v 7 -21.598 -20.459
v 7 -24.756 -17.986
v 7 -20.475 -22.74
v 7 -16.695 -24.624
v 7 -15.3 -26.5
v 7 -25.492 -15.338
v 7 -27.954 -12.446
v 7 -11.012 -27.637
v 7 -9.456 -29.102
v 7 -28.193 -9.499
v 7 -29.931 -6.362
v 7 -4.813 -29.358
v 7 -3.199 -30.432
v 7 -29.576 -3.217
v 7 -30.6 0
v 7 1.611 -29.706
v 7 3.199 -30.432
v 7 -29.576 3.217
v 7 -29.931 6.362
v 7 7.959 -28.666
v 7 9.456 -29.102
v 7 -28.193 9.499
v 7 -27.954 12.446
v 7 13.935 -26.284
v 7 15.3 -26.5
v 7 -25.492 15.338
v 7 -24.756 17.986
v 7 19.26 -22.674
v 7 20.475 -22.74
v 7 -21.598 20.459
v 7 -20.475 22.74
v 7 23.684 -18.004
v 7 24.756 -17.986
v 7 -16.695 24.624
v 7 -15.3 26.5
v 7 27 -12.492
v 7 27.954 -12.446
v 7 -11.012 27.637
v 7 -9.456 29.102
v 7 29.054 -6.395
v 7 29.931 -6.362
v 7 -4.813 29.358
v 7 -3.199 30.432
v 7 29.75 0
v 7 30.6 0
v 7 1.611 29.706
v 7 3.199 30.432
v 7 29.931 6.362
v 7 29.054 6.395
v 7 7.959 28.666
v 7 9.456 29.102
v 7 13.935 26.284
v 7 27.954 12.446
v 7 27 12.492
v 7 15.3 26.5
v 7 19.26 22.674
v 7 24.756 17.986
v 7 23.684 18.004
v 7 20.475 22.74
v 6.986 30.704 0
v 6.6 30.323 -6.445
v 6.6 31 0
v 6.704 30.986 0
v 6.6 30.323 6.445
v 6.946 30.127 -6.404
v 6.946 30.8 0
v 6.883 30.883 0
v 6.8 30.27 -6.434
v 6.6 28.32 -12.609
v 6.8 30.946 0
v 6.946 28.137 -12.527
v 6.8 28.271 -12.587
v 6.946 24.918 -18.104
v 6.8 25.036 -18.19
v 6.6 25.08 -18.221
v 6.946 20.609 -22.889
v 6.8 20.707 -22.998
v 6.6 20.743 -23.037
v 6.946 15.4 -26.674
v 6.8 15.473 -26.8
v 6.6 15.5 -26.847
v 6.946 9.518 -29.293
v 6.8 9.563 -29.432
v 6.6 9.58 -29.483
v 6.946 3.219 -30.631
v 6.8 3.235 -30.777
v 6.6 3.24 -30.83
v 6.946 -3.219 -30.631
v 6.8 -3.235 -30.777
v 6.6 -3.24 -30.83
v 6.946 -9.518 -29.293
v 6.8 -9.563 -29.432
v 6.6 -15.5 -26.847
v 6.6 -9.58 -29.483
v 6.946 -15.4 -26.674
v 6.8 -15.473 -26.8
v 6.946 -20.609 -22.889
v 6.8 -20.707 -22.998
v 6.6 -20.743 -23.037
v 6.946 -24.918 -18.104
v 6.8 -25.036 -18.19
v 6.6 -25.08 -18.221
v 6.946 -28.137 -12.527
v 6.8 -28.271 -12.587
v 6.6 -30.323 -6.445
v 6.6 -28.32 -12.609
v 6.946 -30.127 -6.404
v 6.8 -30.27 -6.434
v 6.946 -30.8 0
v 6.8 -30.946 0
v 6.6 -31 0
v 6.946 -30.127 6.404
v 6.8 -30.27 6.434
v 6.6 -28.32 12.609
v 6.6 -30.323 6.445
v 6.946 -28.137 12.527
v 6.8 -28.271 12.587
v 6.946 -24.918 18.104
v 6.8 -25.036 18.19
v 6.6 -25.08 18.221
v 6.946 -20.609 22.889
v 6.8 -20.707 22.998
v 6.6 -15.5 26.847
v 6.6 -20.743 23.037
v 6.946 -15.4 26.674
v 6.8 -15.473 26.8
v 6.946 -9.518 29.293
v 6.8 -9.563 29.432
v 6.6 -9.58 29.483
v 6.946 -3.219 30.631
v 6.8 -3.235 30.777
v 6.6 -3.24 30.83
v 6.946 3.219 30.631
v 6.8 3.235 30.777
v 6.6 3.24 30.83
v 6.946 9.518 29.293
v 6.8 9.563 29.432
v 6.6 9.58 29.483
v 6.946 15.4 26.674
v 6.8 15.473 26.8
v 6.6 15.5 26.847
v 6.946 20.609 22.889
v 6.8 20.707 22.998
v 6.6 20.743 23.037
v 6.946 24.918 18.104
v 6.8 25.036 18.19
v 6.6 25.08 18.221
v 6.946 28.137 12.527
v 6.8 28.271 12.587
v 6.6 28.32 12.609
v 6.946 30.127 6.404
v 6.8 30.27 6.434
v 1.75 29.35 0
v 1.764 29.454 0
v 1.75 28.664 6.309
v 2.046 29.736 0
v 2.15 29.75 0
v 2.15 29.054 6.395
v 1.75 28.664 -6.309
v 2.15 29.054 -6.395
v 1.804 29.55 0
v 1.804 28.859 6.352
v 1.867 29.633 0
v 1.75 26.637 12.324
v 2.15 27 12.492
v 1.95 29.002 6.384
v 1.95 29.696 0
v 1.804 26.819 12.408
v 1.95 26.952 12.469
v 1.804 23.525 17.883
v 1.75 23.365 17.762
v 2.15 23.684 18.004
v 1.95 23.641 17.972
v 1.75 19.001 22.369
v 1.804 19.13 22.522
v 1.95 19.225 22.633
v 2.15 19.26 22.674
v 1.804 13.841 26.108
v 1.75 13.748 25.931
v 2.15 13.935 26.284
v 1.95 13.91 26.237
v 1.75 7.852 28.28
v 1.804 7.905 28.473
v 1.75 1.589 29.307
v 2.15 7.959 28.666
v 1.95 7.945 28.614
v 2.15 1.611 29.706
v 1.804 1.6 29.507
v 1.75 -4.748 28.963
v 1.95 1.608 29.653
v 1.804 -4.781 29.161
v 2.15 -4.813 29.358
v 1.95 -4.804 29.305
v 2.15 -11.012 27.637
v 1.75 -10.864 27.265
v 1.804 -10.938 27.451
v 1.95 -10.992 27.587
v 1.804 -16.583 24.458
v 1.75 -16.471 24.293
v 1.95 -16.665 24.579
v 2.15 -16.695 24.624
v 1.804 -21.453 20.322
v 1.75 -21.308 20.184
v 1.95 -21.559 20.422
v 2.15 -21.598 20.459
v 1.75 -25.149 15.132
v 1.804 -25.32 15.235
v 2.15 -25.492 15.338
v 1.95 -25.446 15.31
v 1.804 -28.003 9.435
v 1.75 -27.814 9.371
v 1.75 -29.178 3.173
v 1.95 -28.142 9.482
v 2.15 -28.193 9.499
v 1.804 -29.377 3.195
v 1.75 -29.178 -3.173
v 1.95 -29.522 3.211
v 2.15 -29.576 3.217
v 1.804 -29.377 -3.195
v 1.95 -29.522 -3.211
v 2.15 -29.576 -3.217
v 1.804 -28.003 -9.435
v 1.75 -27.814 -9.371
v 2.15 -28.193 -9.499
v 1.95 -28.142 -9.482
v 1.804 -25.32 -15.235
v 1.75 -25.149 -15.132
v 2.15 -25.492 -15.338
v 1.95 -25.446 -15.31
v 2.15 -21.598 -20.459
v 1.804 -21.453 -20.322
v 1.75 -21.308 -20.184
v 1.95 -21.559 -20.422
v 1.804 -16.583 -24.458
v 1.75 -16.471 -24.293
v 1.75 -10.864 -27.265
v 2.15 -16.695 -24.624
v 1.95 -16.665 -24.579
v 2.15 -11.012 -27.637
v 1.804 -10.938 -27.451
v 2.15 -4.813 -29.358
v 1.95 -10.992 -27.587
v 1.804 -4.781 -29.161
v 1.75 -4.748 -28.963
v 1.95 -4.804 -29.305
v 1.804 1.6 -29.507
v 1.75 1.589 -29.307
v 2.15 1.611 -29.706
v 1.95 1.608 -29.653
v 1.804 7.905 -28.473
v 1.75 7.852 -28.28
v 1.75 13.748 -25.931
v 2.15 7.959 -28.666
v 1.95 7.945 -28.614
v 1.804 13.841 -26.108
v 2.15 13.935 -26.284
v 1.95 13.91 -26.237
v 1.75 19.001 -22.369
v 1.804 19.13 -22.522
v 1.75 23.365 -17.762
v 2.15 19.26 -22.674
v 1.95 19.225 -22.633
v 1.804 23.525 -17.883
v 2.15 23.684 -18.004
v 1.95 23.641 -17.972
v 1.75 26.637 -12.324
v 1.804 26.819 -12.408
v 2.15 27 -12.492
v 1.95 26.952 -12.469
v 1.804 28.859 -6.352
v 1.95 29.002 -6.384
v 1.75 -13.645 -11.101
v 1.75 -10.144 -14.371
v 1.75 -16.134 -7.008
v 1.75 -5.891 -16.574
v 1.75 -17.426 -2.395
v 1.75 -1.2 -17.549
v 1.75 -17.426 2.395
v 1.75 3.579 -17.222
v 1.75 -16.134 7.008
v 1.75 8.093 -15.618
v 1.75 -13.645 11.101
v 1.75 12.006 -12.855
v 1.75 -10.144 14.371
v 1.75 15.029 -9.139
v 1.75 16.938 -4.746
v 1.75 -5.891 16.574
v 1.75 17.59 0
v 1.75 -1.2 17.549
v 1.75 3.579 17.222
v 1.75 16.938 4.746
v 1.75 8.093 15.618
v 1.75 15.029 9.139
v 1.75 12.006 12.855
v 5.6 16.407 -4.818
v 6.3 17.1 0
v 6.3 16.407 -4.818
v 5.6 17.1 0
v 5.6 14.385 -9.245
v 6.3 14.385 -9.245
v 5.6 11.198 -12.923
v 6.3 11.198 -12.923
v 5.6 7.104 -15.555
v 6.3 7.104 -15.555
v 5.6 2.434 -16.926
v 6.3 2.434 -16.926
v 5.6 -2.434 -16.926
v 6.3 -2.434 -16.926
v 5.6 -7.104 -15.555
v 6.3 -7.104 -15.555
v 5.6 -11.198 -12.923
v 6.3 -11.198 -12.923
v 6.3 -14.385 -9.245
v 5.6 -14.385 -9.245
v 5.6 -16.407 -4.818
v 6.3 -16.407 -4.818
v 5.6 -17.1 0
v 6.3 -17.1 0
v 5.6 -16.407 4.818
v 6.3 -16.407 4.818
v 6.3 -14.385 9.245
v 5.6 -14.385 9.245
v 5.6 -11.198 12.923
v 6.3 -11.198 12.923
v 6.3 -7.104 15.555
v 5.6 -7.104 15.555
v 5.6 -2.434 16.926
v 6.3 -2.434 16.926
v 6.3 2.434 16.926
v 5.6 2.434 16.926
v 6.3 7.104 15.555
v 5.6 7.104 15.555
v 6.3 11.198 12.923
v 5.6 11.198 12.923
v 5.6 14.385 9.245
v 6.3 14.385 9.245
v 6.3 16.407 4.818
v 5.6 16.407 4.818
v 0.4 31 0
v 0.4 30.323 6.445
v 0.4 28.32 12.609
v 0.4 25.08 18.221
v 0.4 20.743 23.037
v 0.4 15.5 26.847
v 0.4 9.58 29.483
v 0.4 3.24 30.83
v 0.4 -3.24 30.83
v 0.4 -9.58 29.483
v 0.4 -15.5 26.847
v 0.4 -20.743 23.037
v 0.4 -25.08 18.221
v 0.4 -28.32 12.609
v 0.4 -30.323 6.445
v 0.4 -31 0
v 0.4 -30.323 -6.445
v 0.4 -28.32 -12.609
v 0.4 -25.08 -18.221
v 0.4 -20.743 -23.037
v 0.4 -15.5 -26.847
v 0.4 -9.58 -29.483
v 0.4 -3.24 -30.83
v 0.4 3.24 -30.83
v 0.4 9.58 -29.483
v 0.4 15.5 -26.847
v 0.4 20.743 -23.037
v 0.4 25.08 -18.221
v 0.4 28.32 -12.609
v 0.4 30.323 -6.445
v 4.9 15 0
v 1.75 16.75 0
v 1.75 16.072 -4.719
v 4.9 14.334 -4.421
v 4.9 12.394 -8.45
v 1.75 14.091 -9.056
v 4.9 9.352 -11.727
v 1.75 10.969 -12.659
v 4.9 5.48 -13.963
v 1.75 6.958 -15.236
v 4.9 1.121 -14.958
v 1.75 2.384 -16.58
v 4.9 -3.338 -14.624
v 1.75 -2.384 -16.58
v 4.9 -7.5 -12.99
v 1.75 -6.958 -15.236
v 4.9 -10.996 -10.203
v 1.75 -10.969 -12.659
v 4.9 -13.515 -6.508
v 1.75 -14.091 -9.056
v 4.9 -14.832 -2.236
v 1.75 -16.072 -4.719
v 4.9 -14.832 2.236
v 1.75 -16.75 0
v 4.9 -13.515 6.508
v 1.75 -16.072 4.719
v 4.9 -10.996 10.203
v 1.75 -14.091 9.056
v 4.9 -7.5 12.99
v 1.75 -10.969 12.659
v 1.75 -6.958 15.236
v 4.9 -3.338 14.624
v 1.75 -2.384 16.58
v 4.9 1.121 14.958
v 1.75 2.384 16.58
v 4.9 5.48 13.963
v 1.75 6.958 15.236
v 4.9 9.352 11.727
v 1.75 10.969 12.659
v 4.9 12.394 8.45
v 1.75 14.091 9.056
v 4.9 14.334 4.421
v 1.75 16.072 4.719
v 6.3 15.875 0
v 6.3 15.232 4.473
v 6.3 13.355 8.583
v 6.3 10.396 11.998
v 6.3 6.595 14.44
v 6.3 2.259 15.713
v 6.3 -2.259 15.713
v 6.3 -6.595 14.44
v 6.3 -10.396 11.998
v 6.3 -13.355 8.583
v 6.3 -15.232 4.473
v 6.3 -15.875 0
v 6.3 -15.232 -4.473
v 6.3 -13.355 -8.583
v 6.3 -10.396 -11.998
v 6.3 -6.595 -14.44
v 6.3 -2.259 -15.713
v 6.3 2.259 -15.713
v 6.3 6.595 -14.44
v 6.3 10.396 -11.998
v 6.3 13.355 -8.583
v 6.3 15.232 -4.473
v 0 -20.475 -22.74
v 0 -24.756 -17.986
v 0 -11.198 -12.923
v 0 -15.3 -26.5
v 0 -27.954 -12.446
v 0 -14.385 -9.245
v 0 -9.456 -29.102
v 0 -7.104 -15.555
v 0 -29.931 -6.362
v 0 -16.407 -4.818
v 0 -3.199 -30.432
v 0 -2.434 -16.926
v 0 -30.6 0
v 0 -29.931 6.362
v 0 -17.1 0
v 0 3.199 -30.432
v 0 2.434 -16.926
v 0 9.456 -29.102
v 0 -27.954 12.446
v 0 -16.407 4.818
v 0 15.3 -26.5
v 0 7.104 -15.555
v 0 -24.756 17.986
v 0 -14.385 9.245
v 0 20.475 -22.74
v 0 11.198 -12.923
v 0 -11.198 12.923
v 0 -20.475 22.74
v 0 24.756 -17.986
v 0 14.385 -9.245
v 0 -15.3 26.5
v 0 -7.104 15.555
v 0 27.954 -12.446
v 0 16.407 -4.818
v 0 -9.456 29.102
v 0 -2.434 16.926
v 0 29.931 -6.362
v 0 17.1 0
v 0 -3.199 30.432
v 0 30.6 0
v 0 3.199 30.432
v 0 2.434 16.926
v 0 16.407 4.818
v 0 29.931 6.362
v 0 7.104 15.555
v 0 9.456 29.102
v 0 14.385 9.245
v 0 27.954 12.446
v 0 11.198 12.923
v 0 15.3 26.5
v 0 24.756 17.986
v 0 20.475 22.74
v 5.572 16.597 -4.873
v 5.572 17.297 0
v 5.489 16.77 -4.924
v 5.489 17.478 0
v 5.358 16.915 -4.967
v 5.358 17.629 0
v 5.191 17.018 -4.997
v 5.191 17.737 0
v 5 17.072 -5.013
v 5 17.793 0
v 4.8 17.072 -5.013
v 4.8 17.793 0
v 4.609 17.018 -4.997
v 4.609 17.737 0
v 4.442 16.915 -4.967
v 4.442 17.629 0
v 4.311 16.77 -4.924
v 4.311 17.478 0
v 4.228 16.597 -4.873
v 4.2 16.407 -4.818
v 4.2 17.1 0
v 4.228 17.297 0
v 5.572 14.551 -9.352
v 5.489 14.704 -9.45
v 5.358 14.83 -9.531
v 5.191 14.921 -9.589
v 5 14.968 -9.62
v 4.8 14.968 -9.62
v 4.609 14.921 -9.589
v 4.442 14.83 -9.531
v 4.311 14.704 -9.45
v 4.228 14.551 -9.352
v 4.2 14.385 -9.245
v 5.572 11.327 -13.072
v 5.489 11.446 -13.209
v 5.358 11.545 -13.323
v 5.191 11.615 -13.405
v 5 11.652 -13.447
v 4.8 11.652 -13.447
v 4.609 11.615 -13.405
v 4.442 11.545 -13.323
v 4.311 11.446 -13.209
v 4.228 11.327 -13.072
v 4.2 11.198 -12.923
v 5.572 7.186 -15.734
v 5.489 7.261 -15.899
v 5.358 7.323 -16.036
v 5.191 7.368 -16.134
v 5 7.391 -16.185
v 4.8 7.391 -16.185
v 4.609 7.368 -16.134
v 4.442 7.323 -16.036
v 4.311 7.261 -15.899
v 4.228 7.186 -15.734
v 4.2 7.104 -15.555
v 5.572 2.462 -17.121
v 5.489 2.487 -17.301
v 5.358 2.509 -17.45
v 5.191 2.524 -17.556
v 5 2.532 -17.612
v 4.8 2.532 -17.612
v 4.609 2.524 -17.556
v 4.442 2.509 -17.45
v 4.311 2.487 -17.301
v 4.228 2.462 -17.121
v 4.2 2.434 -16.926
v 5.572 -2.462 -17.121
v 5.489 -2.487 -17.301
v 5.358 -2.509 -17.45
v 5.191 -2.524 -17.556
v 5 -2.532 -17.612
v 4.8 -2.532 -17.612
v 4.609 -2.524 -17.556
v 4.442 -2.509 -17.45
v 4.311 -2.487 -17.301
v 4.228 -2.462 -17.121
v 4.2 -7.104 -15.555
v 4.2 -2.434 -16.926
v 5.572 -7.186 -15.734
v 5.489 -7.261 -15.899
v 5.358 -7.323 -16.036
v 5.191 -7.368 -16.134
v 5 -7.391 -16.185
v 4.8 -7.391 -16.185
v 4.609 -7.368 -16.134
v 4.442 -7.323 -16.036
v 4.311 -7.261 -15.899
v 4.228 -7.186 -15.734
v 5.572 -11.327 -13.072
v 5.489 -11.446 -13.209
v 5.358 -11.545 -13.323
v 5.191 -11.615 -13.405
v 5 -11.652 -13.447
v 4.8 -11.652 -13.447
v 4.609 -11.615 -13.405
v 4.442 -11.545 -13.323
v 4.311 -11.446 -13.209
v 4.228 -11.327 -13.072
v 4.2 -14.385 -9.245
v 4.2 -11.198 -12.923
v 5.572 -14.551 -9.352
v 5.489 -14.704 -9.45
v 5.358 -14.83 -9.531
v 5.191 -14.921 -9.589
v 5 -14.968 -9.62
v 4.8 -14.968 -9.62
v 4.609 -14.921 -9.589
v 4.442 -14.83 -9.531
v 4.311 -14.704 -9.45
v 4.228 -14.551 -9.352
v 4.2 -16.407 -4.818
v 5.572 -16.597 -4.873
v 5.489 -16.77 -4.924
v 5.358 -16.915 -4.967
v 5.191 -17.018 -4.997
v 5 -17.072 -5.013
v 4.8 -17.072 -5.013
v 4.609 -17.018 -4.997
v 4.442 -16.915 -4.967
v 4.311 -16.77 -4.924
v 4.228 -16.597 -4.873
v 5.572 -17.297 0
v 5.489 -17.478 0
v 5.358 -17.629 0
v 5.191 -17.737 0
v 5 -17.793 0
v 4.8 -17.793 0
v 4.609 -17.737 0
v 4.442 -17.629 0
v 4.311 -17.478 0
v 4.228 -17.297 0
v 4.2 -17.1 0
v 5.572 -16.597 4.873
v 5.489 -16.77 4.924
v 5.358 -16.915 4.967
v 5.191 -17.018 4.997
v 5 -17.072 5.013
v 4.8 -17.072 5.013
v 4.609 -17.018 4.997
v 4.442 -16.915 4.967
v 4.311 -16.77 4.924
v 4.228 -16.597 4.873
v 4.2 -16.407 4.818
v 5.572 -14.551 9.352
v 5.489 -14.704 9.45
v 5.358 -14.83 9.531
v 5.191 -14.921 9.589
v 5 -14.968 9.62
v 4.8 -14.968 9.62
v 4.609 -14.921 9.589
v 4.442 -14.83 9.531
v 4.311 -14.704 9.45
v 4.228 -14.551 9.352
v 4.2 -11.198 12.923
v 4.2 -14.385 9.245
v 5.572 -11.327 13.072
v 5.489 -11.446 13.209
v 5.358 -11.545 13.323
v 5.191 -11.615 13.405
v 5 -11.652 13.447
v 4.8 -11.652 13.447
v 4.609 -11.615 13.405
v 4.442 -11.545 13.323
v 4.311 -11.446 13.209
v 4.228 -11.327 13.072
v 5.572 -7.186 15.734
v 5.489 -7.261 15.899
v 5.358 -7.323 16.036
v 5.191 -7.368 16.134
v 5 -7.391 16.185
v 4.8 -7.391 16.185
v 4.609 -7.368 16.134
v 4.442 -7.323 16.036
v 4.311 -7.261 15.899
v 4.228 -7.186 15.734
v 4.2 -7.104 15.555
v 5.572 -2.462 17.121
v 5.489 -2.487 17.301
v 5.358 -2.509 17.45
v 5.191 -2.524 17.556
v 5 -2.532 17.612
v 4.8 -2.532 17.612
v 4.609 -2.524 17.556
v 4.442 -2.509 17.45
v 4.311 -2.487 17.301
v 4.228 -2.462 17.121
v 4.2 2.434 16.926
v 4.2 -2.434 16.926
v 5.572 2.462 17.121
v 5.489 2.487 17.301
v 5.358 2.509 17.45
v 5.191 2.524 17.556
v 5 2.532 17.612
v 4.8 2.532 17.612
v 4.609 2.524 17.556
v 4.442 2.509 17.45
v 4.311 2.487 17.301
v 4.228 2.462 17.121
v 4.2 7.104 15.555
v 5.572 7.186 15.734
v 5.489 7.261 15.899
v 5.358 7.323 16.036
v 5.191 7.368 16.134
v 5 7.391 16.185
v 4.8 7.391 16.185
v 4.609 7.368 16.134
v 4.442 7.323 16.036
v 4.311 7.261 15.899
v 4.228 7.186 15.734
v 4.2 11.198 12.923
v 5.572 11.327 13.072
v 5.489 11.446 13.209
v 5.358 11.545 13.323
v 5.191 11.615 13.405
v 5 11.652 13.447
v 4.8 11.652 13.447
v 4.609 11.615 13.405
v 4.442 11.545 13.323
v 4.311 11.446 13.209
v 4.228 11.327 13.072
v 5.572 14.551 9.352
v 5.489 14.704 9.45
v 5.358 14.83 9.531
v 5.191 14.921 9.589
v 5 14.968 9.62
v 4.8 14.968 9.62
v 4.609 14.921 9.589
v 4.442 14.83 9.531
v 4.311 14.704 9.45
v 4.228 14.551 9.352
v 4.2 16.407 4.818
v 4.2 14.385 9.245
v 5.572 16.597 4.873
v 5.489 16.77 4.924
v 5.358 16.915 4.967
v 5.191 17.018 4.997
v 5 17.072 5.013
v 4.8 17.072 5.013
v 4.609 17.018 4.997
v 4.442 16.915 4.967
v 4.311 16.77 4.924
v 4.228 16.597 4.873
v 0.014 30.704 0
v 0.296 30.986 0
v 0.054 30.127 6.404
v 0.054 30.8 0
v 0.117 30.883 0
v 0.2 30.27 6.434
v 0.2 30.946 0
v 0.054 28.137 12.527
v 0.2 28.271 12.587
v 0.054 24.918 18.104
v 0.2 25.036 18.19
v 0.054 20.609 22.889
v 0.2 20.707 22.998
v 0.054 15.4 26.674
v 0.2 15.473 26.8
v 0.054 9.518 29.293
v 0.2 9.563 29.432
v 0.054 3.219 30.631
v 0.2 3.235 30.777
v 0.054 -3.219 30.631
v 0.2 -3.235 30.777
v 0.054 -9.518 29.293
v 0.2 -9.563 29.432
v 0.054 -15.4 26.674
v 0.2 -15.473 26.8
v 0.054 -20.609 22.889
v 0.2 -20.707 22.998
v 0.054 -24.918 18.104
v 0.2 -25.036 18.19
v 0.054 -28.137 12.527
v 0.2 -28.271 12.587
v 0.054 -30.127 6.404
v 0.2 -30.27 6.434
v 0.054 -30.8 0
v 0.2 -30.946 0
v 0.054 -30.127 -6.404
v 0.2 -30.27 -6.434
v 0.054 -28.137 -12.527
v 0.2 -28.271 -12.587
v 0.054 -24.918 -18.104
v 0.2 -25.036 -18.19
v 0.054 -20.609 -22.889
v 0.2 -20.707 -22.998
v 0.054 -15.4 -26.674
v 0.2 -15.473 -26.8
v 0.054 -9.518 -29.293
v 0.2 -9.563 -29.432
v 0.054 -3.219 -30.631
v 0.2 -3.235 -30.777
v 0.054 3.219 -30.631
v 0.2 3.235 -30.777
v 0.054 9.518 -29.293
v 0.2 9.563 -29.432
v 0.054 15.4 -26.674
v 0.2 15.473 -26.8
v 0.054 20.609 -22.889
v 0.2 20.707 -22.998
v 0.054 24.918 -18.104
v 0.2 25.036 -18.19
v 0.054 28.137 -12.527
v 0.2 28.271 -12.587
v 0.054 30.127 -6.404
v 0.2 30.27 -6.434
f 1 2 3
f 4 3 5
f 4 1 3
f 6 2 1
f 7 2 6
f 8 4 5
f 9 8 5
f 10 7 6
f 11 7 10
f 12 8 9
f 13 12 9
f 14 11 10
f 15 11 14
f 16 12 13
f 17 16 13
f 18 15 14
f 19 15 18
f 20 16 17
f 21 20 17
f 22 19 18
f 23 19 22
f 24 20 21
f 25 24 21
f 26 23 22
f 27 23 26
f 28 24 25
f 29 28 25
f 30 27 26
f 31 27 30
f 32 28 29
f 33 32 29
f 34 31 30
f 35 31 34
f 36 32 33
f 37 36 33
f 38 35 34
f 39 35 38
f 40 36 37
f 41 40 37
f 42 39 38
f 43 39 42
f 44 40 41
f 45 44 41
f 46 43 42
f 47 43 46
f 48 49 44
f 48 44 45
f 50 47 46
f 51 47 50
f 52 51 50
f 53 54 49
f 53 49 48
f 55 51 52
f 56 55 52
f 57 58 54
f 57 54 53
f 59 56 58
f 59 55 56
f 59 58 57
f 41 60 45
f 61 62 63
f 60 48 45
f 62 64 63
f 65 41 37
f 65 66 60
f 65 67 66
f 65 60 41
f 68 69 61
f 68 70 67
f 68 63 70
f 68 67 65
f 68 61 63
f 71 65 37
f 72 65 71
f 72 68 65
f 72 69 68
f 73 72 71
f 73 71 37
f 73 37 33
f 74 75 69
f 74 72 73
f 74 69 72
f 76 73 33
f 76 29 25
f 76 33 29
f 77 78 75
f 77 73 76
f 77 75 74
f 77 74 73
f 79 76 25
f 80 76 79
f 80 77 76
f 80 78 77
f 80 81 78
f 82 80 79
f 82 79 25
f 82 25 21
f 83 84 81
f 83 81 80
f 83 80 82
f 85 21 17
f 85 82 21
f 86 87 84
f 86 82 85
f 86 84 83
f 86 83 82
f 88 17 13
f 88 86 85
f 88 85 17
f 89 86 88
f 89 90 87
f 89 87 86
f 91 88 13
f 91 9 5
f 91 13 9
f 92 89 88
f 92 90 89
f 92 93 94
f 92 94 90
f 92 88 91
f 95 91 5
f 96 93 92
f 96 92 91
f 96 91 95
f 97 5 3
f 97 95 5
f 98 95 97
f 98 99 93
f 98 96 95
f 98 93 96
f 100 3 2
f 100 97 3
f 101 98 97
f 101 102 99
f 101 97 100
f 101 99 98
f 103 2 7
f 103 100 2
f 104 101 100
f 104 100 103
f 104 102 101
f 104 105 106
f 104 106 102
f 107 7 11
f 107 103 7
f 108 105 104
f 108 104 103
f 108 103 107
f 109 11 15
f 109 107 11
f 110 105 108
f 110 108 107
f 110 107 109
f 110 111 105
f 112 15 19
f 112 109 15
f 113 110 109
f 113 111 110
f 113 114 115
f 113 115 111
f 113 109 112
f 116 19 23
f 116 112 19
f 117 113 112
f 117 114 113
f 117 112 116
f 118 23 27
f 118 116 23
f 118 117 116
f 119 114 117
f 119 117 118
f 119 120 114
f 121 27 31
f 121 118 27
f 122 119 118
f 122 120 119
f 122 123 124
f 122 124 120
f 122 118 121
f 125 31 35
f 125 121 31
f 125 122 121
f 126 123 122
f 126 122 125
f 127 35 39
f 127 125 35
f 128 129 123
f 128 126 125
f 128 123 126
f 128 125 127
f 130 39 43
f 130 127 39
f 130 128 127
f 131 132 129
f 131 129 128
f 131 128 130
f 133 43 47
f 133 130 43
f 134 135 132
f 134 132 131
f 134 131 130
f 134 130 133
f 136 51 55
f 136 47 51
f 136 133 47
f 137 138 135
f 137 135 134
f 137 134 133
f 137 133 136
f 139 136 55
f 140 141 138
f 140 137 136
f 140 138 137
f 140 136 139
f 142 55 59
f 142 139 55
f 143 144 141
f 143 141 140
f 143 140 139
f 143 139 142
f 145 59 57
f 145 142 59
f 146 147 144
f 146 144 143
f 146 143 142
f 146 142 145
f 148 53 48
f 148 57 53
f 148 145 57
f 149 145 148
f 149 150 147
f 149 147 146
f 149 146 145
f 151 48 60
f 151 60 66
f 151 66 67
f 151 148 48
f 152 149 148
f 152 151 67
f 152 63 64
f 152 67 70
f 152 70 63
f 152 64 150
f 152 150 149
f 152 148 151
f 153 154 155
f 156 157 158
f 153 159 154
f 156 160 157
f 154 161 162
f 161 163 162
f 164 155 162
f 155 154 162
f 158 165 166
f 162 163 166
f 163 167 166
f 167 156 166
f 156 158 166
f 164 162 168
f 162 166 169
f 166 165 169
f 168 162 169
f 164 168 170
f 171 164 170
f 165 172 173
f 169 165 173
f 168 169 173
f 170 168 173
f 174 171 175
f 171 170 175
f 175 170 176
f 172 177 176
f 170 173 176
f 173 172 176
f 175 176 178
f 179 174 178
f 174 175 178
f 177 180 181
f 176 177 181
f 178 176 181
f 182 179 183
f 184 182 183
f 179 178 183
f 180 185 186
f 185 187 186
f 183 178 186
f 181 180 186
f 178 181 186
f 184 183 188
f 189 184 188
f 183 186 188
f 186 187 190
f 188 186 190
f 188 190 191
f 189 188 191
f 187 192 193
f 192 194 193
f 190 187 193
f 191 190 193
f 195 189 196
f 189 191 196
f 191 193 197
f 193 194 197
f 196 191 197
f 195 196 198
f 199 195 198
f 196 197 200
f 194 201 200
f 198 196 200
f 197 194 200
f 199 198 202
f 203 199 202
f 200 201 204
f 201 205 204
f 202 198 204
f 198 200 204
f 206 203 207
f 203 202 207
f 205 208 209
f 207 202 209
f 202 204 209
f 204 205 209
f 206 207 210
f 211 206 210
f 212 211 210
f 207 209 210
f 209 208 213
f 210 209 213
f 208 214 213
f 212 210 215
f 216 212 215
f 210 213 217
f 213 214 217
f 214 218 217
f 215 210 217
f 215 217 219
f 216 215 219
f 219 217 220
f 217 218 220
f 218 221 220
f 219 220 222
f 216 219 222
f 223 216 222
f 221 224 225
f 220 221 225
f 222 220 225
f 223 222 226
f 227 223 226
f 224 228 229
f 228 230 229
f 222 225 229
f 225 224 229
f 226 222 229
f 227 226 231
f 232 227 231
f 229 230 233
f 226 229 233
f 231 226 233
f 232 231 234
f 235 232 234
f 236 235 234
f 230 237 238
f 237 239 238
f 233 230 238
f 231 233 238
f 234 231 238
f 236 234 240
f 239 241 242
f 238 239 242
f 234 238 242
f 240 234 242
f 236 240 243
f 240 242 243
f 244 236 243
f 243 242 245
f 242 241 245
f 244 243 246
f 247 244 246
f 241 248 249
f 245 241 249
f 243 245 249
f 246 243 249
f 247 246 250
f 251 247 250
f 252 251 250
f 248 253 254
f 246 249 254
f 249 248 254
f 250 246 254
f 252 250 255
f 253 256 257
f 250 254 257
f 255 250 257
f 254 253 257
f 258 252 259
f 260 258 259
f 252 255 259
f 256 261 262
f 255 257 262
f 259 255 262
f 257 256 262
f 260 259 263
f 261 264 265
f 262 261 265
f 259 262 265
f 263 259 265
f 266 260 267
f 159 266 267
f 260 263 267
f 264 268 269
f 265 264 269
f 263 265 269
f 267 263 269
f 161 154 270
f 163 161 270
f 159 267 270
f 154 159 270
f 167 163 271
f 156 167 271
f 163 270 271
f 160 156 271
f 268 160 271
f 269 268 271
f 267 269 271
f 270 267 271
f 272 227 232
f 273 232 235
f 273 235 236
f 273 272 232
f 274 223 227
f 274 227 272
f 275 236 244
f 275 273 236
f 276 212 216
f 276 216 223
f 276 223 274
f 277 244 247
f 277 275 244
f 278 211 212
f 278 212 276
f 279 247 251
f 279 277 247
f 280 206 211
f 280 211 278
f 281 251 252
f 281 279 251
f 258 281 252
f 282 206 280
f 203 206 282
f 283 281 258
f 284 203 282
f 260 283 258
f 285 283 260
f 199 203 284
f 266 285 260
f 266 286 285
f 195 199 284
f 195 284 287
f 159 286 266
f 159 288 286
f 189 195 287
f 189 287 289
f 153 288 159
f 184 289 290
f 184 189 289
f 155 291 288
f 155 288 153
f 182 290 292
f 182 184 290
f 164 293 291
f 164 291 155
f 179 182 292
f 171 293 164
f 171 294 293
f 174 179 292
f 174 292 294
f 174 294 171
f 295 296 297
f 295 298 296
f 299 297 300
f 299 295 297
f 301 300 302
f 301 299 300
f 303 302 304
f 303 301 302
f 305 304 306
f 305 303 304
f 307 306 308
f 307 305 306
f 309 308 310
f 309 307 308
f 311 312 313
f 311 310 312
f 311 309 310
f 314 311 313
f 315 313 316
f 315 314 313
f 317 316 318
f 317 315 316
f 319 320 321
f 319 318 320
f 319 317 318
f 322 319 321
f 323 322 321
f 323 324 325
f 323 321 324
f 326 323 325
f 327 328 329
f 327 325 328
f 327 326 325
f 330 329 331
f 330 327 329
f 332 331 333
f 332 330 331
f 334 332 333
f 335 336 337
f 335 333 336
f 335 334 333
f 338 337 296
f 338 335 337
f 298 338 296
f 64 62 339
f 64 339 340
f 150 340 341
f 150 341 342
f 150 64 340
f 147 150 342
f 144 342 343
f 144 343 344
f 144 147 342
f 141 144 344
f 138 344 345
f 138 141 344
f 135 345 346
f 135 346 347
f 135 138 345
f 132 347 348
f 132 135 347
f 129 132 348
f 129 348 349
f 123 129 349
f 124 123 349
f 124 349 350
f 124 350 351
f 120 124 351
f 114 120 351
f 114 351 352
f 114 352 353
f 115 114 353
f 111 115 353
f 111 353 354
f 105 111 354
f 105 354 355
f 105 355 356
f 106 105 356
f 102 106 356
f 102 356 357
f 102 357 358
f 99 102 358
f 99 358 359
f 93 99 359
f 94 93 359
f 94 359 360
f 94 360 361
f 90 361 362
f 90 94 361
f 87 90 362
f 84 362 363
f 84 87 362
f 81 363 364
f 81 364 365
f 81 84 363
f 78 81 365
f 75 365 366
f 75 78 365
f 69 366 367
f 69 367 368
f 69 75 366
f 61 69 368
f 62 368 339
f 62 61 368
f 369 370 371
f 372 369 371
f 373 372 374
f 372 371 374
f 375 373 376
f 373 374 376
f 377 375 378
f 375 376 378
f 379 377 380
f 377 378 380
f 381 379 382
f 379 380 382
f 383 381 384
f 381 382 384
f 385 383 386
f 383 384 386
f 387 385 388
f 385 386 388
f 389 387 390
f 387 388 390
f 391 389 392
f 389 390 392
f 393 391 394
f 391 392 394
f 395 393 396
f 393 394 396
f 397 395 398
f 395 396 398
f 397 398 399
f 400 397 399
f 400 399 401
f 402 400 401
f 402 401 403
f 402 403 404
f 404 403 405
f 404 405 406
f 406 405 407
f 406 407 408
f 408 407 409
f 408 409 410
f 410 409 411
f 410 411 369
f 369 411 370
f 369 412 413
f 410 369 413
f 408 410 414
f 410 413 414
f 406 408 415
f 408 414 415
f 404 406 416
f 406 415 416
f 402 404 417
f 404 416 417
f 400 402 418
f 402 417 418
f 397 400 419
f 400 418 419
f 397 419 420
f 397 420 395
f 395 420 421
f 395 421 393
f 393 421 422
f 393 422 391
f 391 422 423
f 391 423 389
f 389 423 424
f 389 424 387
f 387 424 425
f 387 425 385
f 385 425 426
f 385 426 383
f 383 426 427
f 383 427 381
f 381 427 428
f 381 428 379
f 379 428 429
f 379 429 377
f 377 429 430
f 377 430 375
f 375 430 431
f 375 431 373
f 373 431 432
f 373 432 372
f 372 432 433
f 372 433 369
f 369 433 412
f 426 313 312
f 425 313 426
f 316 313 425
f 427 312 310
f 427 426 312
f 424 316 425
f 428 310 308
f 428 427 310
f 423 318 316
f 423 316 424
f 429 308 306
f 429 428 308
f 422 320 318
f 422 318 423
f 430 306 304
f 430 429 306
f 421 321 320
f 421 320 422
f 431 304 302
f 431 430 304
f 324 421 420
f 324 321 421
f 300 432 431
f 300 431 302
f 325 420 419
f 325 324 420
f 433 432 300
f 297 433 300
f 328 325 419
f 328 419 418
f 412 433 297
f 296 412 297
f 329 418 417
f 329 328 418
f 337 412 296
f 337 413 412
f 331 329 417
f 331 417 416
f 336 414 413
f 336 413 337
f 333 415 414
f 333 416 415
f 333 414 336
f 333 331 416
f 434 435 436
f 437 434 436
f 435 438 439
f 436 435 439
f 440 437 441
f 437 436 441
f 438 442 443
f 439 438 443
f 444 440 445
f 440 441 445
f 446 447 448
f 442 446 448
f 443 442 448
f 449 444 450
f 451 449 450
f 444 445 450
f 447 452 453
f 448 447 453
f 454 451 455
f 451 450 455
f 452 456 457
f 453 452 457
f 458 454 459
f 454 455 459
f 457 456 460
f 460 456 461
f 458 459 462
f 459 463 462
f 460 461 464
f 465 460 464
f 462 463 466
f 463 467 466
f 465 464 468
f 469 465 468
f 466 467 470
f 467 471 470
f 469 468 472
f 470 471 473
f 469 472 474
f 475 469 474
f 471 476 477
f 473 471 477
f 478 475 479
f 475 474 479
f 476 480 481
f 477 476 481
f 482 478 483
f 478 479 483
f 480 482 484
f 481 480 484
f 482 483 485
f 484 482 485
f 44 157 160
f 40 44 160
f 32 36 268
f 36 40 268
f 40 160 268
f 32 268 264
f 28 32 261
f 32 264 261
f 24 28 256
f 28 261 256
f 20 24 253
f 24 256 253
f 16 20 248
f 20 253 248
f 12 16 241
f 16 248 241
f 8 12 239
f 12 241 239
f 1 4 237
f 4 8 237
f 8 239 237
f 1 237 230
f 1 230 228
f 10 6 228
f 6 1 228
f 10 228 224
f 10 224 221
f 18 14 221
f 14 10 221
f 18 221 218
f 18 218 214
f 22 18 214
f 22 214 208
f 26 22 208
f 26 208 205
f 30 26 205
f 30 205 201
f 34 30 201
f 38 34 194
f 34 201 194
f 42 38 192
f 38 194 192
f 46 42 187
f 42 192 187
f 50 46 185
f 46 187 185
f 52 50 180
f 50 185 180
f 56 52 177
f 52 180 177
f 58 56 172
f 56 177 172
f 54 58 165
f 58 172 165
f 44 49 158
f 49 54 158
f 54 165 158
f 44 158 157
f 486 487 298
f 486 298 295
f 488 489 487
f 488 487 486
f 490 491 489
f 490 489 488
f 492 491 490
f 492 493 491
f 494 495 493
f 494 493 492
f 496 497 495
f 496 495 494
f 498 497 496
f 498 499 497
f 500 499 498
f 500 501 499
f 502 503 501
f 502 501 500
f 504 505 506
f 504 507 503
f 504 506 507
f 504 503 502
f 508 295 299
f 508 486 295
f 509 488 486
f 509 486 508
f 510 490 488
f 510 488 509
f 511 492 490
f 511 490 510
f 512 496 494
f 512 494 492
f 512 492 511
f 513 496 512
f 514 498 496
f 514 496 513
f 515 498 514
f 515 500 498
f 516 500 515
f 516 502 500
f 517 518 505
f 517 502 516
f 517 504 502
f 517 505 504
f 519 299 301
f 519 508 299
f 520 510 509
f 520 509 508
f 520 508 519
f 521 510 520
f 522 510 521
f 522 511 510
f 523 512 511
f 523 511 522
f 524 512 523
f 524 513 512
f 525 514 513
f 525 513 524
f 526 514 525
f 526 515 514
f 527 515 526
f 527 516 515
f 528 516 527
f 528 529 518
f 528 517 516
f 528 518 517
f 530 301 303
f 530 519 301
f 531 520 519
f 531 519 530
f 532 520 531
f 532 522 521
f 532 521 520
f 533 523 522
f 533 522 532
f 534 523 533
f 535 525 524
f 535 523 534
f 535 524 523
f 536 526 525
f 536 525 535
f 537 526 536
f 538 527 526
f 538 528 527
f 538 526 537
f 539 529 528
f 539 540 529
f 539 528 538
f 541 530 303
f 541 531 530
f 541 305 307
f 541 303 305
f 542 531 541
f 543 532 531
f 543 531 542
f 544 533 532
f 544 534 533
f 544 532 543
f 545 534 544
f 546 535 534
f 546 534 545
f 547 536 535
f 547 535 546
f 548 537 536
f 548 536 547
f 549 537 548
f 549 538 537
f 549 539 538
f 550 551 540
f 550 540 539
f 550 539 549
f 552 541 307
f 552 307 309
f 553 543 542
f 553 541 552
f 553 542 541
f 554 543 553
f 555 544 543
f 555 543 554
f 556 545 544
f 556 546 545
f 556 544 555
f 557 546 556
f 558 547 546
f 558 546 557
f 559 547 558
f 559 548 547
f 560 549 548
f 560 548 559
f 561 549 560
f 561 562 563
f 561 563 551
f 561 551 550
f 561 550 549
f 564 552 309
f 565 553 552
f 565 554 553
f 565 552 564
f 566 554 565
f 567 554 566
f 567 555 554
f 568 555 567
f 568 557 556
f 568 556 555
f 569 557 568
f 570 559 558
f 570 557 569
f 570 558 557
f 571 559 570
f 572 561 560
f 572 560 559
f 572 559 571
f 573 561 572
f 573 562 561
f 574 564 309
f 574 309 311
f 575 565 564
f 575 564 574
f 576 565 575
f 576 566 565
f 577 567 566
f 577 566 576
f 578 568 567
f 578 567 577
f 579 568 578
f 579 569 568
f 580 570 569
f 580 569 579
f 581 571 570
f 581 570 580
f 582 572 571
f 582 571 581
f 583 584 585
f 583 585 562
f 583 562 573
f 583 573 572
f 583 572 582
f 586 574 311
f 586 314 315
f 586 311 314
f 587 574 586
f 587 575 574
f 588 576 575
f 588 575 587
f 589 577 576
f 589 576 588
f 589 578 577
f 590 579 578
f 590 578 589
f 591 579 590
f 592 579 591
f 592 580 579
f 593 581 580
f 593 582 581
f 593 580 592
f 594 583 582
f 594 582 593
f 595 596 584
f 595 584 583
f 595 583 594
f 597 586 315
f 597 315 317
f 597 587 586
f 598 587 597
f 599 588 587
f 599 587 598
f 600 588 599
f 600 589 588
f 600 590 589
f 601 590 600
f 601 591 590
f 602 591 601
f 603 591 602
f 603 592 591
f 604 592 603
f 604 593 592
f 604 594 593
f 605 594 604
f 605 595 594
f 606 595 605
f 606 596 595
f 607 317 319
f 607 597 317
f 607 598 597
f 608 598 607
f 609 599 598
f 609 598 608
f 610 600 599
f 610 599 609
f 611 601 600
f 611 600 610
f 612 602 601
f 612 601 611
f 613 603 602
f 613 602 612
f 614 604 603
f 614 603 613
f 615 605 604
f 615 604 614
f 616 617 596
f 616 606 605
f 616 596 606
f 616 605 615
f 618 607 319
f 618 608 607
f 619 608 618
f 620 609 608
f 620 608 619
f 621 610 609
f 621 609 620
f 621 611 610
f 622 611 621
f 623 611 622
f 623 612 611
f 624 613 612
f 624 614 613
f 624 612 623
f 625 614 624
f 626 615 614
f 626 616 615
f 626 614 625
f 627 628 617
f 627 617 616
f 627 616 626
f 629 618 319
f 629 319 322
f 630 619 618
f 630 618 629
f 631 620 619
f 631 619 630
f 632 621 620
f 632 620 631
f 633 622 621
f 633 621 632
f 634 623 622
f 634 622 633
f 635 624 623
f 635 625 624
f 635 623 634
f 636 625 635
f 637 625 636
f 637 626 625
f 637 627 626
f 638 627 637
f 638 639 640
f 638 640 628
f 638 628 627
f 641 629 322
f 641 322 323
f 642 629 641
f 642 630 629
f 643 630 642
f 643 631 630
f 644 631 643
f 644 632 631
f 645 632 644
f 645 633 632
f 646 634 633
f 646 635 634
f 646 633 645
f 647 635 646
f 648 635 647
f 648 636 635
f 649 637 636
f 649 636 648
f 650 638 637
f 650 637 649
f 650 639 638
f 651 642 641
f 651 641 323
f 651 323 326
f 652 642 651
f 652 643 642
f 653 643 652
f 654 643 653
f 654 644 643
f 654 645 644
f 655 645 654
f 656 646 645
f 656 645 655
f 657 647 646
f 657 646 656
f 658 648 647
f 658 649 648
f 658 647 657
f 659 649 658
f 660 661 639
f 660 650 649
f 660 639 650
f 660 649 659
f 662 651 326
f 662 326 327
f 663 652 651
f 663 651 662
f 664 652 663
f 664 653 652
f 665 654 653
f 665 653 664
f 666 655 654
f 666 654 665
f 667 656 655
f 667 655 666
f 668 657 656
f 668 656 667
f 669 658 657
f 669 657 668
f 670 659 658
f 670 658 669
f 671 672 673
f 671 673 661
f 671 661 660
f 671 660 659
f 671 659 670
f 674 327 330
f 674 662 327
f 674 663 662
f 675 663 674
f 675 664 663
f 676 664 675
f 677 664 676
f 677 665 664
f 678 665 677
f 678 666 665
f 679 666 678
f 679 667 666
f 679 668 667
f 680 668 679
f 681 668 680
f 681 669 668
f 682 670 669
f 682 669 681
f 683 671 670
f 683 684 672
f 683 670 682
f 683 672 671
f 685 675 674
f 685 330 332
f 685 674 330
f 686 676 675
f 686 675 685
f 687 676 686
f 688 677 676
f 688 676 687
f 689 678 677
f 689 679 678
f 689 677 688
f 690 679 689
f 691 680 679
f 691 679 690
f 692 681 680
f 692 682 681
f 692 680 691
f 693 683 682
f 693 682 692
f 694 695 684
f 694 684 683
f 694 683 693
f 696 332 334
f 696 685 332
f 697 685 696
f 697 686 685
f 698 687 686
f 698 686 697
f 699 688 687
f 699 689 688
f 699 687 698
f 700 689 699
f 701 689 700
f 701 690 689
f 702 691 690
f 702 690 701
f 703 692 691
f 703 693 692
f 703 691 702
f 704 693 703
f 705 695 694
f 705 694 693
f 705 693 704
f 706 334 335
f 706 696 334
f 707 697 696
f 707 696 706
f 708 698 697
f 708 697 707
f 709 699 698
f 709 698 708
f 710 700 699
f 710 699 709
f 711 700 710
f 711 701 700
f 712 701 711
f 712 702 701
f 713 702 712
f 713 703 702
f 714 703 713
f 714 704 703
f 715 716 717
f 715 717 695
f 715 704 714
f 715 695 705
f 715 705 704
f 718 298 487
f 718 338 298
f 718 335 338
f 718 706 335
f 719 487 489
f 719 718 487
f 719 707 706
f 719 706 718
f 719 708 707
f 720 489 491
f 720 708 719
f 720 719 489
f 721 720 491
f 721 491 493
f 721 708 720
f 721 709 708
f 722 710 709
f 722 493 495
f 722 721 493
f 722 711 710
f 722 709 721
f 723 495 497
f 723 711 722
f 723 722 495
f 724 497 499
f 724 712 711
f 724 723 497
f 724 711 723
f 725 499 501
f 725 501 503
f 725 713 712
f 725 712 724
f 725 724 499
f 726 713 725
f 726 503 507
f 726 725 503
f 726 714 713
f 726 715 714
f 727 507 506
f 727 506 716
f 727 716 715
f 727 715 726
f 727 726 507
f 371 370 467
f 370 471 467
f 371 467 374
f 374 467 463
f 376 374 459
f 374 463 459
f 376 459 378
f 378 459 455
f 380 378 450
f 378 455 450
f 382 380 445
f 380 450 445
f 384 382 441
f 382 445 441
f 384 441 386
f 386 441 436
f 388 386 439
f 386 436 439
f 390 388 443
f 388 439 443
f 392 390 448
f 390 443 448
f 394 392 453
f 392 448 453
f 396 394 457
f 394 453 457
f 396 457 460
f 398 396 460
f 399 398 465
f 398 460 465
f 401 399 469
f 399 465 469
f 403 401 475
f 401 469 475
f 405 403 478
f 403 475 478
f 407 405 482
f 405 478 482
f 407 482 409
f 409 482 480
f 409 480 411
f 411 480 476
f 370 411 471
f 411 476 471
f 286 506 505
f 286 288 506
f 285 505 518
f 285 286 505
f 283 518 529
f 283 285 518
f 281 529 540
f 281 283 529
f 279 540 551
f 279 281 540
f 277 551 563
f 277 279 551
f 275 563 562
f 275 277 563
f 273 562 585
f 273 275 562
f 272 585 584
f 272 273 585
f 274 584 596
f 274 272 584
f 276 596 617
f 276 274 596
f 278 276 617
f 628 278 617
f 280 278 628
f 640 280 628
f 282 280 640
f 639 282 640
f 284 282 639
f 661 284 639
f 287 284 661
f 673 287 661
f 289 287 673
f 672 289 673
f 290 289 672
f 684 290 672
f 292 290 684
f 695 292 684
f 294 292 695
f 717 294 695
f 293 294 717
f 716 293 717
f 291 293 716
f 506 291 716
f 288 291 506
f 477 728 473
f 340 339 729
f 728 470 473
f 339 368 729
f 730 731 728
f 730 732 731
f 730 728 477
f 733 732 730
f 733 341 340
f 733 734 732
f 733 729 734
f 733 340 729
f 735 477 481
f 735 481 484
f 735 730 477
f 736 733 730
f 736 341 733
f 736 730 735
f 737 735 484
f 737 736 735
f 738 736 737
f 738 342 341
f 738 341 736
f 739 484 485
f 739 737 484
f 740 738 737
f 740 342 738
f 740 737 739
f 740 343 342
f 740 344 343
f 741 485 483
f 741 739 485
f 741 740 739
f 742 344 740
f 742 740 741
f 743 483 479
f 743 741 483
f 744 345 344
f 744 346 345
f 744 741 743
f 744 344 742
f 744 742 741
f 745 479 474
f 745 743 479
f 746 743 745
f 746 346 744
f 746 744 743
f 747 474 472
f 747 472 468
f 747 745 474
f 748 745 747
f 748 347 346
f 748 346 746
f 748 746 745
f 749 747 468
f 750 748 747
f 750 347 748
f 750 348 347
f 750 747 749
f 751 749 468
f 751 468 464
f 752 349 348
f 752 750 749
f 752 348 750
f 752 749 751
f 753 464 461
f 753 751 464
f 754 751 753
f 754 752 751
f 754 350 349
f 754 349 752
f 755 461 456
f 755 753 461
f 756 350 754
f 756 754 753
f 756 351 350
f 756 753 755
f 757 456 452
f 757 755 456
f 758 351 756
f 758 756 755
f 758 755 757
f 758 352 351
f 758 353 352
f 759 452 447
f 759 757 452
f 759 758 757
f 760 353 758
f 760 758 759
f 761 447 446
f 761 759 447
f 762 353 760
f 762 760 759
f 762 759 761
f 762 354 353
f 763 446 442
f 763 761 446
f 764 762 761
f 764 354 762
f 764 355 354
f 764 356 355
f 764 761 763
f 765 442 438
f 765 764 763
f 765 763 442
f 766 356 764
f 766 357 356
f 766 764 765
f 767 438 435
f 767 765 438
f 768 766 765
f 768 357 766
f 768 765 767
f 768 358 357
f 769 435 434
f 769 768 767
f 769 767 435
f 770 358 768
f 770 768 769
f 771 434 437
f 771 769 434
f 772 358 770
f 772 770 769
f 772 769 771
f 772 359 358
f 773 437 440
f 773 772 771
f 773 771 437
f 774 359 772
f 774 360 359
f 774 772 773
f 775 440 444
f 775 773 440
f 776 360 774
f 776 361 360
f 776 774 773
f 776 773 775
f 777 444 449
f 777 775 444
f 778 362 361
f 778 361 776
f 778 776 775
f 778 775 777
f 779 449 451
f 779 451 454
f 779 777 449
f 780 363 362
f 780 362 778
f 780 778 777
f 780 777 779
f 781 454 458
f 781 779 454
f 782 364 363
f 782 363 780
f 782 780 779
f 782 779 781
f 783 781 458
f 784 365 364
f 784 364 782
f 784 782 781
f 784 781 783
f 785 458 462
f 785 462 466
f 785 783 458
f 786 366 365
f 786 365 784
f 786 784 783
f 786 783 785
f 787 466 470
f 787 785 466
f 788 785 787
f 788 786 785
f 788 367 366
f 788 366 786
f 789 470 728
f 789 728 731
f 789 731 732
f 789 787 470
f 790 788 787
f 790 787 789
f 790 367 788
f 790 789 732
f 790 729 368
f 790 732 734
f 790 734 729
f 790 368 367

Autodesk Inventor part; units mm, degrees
ref_plane "YZ Plane" through (0, 0, 0) normal (1, 0, 0) x (0, 1, 0)
ref_plane "XZ Plane" through (0, 0, 0) normal (0, 1, 0) x (-1, 0, 0)
ref_plane "XY Plane" through (0, 0, 0) normal (0, 0, 1) x (1, 0, 0)
sketch "Sketch1" plane through (0, 0, 0) normal (0, 0, 1) x (1, 0, 0)
  circle A0 centre (4.9, 17.1) radius 0.455
  circle A1 centre (4.9, 17.1) radius 0.7
  line L0 (6.3, 15.875) -> (6.3, 17.1)
  line L1 (0, 31) -> (7, 31)
  line L2 (7, 31) -> (7, 29.75)
  line L3 (7, 29.75) -> (1.75, 29.75)
  line L4 (0, 0) -> (9.5856, 0)
  line L5 (0, 31) -> (0, 17.1)
  line L6 (0, 17.1) -> (1.75, 16.75)
  line L7 (1.75, 16.75) -> (4.9, 15)
  line L8 (4.9, 15) -> (6.3, 15.875)
  line L9 (4.9, 15) -> (0, 15) construction
  line L10 (0, 31.2) -> (0, -5.2) projected
  line L11 (-1.9171, 0) -> (11.5027, 0) projected
  line L12 (4.2, 17.1) -> (1.75, 17.59)
  line L13 (1.75, 17.59) -> (1.75, 29.75)
  line L14 (6.3, 17.1) -> (5.6, 17.1)
  dimension "d0" = 62
  dimension "d1" = 31.75
  dimension "d2" = 1.25
  dimension "d3" = 0.91
  dimension "d4" = 1.4
  dimension "d5" = 30
  dimension "d6" = 33.5
  dimension "d7" = 34.2
  dimension "d8" = 4.9
  dimension "d9" = 6.3
  dimension "d10" = 7
  dimension "d12" = 1.75
revolve "Body" add sketch "Sketch1" angle 360 about axis through (0, 0, 0) along (1, 0, 0) contours L14 L0 L8 L7 L6 L5 L1 L2 L3 L13 L12 A1
revolve "Spring1" add sketch "Sketch1" angle 360 about axis through (0, 0, 0) along (1, 0, 0) contours A0 | A1
fillet "Fillet1" radius 0.4 3 edges at (7, -31, 0) (1.75, -29.75, 0) (0, -31, 0)
equation "\"d0\" = SD2"
equation "\"d1\" = ABDM"
equation "\"d3\" = SPDI"
equation "\"d4\" = SPDA"
equation "\"d5\" = NND"
equation "\"d6\" = TKDM"
equation "\"d7\" = HLDM"
equation "\"d8\" = SPDST"
equation "\"d9\" = SDI"
equation "\"d10\" = SWDT"
equation "\"d12\" = SD"
equation "\"d11\" = RR"
equation "\"SD2\" = 62"
equation "\"SWDT\" = 7"
equation "\"RR\" = 0.4"
equation "\"SD\" = 1.75"
equation "\"NND\" = 30"
equation "\"SPDA\" = 1.4"
equation "\"SPDI\" = 0.91"
equation "\"TKDM\" = 33.5"
equation "\"HLDM\" = 34.2"
equation "\"ABDM\" = 31.75"
equation "\"SDI\" = 6.3"
equation "\"SPDST\" = 4.9"
equation "\"LAB\" = 0.35"
properties part number "PWTR-0069" material "Rubber"
